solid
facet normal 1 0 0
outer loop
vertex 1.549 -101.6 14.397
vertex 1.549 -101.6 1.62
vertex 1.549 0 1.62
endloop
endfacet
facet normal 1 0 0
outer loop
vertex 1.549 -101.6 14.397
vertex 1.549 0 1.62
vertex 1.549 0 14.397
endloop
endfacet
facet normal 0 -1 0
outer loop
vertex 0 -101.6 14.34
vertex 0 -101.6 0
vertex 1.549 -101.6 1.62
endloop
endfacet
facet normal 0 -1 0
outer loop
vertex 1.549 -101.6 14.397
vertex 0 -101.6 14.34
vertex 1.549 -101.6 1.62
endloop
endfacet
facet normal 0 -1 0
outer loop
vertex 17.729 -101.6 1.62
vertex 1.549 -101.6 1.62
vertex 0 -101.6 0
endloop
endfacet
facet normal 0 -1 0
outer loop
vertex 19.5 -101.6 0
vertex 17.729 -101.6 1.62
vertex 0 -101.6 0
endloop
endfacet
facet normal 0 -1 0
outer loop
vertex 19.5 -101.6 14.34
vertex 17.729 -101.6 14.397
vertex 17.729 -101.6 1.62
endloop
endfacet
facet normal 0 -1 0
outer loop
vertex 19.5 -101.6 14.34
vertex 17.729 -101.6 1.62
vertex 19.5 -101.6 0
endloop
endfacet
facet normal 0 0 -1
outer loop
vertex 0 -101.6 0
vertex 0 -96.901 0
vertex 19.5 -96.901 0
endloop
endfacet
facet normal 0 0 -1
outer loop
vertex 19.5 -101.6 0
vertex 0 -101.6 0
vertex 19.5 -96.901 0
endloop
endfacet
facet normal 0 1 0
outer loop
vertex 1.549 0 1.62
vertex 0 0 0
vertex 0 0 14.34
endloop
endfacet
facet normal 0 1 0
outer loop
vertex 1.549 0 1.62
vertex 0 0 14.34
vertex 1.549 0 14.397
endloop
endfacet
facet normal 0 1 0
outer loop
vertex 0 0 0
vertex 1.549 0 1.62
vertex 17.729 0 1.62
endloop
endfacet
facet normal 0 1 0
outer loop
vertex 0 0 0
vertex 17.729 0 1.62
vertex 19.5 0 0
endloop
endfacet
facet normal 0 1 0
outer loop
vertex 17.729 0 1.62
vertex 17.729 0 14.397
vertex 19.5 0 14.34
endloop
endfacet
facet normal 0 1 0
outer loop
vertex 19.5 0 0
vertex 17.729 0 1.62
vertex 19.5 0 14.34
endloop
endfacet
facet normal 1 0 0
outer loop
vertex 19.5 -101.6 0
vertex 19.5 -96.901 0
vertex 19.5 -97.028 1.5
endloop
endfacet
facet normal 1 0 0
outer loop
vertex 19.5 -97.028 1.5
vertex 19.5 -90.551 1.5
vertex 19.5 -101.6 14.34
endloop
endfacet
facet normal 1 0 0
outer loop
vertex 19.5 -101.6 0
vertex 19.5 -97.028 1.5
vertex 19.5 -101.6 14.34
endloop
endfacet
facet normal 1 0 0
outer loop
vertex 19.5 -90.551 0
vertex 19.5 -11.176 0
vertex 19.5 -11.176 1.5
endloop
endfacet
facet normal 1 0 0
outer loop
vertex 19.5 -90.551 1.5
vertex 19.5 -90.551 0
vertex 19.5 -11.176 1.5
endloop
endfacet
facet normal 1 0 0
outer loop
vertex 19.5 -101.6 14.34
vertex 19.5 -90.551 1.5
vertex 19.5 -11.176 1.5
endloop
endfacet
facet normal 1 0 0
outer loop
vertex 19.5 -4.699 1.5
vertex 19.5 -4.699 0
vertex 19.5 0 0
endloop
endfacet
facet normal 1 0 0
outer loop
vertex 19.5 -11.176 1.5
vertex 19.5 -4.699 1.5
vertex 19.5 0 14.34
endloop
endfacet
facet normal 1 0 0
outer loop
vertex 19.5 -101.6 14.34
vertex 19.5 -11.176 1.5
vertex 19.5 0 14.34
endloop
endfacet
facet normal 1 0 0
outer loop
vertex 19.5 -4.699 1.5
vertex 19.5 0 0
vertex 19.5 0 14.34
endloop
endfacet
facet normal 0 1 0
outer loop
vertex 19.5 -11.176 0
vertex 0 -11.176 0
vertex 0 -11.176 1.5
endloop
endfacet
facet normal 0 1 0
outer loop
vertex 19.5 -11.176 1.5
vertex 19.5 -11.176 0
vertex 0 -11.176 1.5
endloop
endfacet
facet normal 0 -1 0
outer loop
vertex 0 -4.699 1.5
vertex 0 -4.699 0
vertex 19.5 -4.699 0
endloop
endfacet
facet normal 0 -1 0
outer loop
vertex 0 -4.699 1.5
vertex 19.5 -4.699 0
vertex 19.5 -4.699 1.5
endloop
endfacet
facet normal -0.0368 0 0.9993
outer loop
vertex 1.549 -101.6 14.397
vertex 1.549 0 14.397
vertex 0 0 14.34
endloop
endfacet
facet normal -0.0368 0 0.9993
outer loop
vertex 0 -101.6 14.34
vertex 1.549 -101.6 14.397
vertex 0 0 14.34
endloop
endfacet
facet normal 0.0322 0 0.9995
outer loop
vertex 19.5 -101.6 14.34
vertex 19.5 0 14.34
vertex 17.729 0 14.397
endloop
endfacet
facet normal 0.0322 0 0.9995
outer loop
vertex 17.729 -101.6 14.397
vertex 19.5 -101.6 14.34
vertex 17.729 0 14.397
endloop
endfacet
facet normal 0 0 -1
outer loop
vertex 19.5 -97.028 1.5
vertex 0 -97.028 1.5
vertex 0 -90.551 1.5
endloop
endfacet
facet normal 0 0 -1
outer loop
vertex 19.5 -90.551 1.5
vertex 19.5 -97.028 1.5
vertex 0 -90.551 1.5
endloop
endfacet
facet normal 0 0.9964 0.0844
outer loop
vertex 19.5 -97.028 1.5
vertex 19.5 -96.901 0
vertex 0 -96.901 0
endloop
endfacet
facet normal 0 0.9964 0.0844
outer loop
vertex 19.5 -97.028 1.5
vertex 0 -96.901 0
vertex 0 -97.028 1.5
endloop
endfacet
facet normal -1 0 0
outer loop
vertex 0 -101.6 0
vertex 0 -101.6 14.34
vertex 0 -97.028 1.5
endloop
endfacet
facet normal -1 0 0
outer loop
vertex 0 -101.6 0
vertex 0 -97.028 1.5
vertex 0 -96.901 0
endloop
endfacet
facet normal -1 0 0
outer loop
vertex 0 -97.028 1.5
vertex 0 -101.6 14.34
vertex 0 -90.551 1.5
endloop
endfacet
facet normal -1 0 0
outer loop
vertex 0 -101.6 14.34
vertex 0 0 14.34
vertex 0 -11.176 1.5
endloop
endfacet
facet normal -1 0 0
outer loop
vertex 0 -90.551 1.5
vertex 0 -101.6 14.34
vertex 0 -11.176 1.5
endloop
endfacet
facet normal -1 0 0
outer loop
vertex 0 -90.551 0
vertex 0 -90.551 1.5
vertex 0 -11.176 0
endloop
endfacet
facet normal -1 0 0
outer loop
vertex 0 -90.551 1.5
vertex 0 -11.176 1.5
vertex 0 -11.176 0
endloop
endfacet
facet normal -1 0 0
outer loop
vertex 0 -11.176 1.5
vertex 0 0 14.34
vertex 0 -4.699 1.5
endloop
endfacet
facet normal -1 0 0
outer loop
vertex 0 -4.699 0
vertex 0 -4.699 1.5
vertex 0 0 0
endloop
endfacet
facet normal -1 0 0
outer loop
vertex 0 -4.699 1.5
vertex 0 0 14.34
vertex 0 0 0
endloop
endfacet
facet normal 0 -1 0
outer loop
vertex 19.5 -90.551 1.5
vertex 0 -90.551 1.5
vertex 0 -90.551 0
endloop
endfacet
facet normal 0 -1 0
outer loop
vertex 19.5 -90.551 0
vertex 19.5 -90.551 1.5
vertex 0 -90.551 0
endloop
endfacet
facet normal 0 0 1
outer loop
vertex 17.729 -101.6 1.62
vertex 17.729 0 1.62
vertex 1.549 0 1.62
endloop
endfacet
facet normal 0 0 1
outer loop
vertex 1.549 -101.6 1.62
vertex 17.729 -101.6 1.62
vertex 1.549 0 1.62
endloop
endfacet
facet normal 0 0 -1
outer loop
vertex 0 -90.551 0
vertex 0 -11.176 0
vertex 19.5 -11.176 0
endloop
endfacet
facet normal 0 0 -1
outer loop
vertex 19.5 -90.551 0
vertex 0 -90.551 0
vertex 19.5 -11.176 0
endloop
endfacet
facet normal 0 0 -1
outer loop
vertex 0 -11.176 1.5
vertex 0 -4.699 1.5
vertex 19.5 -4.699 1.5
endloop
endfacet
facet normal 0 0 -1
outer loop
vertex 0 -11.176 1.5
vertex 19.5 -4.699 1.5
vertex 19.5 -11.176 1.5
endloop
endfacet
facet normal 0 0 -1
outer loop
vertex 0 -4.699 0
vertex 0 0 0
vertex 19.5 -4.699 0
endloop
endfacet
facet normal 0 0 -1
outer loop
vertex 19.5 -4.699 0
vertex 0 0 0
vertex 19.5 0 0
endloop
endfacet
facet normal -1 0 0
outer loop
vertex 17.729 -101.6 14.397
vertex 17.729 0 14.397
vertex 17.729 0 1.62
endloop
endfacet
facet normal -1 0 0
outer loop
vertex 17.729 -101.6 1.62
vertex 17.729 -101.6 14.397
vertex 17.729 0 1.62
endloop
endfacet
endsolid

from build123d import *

# Parameters (mm, degrees)
F1_DEPTH = 101.6
F2_W     = 6.477
F2_H     = 1.5
F3_DEPTH = 19.5


with BuildPart() as f1:
    # F0 (on Front) → F1 (new body)
    with BuildSketch(Plane.XZ):
        Polygon((0, 14.34), (0, 0), (19.5, 0), (19.5, 14.34), (17.728965, 14.396643), (17.728965, 1.62), (1.548965, 1.62), (1.548965, 14.396643), align=None)
    extrude(amount=F1_DEPTH)

    # F2 (on face) → F3 (cut, through all)
    with BuildSketch(Plane(origin=(0, 0, 0), x_dir=(0, -1, 0), z_dir=(-1, 0, 0))):
        with Locations((7.9375, 0.75)):
            Rectangle(F2_W, F2_H)
        Polygon((90.551, 1.5), (90.551, 0), (96.901, 0), (97.028, 1.5), align=None)
    extrude(amount=-F3_DEPTH, mode=Mode.SUBTRACT)


solid = f1.part
